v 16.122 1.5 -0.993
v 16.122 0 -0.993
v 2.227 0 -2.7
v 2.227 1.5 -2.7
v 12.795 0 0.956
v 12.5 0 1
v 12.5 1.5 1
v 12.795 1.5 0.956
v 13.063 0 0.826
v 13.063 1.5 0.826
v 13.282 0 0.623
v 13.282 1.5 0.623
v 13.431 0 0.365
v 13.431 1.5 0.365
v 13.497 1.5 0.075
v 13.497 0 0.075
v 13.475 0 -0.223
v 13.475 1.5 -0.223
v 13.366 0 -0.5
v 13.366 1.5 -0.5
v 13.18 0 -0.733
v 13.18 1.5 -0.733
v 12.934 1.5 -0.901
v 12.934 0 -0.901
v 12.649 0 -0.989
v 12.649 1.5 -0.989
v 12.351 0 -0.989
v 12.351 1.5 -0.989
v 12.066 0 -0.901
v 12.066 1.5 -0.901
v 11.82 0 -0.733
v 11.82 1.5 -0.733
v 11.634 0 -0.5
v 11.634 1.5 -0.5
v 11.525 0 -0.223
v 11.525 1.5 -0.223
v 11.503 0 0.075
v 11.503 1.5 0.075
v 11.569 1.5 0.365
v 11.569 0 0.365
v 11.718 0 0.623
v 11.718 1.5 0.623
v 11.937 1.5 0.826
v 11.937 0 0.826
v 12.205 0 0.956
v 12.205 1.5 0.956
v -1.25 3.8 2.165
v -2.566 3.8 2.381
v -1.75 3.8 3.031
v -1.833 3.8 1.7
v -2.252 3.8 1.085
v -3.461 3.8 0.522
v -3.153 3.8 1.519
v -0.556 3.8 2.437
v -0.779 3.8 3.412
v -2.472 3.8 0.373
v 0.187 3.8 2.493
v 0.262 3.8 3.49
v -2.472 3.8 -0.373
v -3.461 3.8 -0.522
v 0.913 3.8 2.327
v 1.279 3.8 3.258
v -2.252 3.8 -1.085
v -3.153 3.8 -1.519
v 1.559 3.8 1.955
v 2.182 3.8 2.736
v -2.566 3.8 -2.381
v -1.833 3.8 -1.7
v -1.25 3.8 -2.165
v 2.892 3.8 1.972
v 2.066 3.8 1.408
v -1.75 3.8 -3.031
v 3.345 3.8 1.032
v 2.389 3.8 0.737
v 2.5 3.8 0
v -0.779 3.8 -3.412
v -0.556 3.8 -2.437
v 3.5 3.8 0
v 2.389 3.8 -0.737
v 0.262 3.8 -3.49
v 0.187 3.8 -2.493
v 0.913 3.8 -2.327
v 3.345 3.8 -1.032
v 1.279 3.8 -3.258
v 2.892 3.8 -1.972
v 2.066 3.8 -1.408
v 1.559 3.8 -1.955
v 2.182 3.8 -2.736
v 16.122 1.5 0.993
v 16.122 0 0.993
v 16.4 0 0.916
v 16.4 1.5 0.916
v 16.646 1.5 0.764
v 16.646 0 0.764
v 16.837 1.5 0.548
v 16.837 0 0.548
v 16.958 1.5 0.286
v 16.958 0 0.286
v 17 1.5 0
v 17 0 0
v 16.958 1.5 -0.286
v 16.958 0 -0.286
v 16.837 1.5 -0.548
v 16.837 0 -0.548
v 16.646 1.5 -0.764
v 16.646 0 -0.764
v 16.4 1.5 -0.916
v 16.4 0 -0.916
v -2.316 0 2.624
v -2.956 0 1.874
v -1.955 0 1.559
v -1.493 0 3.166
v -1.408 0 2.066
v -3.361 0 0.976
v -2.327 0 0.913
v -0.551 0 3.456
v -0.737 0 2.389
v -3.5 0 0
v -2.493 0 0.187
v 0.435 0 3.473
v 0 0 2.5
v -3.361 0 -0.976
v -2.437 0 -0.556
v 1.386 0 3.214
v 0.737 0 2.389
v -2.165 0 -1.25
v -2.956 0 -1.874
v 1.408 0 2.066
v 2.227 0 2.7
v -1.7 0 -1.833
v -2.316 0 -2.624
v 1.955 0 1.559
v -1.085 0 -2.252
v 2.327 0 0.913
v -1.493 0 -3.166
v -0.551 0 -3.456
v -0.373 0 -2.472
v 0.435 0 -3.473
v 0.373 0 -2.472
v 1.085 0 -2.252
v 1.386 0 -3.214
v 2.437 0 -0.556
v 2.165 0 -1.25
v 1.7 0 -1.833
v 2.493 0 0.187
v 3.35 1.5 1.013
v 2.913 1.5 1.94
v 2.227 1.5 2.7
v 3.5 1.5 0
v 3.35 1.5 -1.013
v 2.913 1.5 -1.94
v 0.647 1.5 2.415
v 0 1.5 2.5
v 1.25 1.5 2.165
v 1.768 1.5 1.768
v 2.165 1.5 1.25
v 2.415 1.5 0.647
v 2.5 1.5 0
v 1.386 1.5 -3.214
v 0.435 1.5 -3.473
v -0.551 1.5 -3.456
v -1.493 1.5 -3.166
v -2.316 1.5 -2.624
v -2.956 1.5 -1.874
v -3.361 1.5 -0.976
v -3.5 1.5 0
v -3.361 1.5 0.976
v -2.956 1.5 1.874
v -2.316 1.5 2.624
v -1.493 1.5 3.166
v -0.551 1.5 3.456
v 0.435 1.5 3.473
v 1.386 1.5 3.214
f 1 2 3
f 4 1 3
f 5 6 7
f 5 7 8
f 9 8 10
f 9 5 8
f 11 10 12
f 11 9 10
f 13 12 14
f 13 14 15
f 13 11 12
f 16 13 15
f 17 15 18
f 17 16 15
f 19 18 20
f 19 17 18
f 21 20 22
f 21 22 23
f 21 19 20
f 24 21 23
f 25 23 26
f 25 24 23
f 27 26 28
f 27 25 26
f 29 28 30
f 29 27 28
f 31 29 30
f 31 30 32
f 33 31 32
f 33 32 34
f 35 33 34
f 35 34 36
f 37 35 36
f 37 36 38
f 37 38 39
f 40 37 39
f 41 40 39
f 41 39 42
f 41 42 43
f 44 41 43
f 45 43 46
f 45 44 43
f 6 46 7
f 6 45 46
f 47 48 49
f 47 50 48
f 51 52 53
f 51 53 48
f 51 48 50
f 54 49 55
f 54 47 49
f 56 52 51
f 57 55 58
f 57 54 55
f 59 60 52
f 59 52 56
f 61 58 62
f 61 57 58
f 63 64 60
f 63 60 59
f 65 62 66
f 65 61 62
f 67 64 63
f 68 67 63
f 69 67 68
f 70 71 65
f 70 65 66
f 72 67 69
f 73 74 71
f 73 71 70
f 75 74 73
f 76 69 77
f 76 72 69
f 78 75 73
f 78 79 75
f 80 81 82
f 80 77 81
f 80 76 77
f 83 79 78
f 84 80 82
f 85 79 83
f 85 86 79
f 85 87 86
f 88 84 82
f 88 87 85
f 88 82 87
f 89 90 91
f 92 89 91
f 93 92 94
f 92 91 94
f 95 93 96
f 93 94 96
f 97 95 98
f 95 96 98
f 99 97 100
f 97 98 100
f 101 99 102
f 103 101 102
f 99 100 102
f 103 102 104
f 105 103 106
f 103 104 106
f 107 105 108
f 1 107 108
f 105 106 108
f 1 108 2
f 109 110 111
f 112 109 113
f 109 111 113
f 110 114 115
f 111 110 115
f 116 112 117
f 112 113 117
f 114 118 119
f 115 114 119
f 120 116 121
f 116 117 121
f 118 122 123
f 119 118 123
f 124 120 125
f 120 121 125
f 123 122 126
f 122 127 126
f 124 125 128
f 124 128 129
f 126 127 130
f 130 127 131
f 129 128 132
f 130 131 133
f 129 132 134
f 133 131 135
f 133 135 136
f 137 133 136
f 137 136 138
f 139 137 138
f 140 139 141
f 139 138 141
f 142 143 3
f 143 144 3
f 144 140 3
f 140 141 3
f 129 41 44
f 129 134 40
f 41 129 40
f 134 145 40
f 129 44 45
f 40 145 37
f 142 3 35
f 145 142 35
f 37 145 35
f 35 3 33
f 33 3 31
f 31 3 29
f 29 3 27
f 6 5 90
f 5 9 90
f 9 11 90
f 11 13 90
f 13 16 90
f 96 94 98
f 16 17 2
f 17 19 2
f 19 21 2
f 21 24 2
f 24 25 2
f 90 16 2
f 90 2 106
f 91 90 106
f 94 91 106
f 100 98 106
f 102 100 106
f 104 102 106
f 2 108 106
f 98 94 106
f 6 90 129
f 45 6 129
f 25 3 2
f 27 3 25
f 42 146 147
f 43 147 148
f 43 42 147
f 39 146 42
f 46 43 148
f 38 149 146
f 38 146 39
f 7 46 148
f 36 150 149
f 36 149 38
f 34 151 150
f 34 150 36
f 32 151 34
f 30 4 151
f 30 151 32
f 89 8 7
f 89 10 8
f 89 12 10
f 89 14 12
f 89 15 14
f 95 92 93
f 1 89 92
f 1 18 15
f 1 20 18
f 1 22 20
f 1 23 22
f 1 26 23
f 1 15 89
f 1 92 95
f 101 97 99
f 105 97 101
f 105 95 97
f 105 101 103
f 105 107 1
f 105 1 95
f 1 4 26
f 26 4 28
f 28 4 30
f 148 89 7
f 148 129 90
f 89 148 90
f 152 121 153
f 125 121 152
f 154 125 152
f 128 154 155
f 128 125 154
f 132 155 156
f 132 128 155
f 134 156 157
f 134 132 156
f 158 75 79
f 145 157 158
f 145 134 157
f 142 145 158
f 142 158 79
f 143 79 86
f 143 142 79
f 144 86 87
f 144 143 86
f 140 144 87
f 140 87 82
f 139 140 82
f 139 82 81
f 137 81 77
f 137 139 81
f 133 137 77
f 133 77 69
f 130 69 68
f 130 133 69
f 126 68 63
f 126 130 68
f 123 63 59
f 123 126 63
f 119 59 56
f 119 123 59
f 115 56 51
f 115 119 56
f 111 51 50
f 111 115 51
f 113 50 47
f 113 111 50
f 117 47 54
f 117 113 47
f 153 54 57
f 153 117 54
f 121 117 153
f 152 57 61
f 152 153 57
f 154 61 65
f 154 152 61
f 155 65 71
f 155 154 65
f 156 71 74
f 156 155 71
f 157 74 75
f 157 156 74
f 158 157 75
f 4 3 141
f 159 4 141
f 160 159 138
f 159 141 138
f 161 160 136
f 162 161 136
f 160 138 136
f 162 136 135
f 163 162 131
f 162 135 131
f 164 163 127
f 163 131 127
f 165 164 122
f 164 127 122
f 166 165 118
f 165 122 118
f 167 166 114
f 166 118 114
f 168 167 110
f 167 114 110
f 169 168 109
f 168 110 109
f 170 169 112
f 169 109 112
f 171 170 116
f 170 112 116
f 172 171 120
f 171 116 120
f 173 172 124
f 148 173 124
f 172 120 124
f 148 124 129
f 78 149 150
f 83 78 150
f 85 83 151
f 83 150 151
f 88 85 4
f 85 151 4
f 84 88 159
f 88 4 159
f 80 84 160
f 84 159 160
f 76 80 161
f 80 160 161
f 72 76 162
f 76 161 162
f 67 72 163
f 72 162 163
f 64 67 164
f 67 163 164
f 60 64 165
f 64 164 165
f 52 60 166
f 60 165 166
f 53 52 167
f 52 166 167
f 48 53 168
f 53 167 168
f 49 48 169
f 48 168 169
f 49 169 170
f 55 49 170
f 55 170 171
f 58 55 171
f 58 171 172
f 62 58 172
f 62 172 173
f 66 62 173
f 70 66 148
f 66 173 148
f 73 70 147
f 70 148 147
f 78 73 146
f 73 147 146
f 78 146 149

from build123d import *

# Parameters (mm, degrees)
SKETCH1_R           = 2.5
SKETCH1_R_2         = 1
BOSS_EXTRUDE1_DEPTH = 1.5
SKETCH1_3_R         = 2.5
BOSS_EXTRUDE2_DEPTH = 3.8


with BuildPart() as part:
    # Sketch1 → Boss-Extrude1 (new body)
    with BuildSketch(Plane(origin=(0, 0, 0), x_dir=(1, 0, 0), z_dir=(0, 1, 0))):
        with BuildLine():
            ThreePointArc((2.227105745, 2.7), (-3.5, 0), (2.227105745, -2.7))
            Line((2.227105745, -2.7), (16.121967257, -0.992534124))
            ThreePointArc((16.121967257, -0.992534124), (17, 0), (16.121967257, 0.992534124))
            Line((16.121967257, 0.992534124), (2.227105745, 2.7))
        make_face()
        Circle(SKETCH1_R, mode=Mode.SUBTRACT)
        with Locations((12.5, 0)):
            Circle(SKETCH1_R_2, mode=Mode.SUBTRACT)
    extrude(amount=BOSS_EXTRUDE1_DEPTH)

    # Sketch1<3> → Boss-Extrude2 (add)
    with BuildSketch(Plane(origin=(0, 0, 0), x_dir=(1, 0, 0), z_dir=(0, 1, 0))):
        with BuildLine():
            ThreePointArc((2.227105745, 2.7), (0, 3.5), (-2.227105745, 2.7))
            ThreePointArc((-2.227105745, 2.7), (-3.5, 0), (-2.227105745, -2.7))
            ThreePointArc((-2.227105745, -2.7), (0, -3.5), (2.227105745, -2.7))
            ThreePointArc((2.227105745, -2.7), (3.165822966, -1.492502913), (3.5, 0))
            ThreePointArc((3.5, 0), (3.165822966, 1.492502913), (2.227105745, 2.7))
        make_face()
        Circle(SKETCH1_3_R, mode=Mode.SUBTRACT)
    extrude(amount=BOSS_EXTRUDE2_DEPTH)


solid = part.part
